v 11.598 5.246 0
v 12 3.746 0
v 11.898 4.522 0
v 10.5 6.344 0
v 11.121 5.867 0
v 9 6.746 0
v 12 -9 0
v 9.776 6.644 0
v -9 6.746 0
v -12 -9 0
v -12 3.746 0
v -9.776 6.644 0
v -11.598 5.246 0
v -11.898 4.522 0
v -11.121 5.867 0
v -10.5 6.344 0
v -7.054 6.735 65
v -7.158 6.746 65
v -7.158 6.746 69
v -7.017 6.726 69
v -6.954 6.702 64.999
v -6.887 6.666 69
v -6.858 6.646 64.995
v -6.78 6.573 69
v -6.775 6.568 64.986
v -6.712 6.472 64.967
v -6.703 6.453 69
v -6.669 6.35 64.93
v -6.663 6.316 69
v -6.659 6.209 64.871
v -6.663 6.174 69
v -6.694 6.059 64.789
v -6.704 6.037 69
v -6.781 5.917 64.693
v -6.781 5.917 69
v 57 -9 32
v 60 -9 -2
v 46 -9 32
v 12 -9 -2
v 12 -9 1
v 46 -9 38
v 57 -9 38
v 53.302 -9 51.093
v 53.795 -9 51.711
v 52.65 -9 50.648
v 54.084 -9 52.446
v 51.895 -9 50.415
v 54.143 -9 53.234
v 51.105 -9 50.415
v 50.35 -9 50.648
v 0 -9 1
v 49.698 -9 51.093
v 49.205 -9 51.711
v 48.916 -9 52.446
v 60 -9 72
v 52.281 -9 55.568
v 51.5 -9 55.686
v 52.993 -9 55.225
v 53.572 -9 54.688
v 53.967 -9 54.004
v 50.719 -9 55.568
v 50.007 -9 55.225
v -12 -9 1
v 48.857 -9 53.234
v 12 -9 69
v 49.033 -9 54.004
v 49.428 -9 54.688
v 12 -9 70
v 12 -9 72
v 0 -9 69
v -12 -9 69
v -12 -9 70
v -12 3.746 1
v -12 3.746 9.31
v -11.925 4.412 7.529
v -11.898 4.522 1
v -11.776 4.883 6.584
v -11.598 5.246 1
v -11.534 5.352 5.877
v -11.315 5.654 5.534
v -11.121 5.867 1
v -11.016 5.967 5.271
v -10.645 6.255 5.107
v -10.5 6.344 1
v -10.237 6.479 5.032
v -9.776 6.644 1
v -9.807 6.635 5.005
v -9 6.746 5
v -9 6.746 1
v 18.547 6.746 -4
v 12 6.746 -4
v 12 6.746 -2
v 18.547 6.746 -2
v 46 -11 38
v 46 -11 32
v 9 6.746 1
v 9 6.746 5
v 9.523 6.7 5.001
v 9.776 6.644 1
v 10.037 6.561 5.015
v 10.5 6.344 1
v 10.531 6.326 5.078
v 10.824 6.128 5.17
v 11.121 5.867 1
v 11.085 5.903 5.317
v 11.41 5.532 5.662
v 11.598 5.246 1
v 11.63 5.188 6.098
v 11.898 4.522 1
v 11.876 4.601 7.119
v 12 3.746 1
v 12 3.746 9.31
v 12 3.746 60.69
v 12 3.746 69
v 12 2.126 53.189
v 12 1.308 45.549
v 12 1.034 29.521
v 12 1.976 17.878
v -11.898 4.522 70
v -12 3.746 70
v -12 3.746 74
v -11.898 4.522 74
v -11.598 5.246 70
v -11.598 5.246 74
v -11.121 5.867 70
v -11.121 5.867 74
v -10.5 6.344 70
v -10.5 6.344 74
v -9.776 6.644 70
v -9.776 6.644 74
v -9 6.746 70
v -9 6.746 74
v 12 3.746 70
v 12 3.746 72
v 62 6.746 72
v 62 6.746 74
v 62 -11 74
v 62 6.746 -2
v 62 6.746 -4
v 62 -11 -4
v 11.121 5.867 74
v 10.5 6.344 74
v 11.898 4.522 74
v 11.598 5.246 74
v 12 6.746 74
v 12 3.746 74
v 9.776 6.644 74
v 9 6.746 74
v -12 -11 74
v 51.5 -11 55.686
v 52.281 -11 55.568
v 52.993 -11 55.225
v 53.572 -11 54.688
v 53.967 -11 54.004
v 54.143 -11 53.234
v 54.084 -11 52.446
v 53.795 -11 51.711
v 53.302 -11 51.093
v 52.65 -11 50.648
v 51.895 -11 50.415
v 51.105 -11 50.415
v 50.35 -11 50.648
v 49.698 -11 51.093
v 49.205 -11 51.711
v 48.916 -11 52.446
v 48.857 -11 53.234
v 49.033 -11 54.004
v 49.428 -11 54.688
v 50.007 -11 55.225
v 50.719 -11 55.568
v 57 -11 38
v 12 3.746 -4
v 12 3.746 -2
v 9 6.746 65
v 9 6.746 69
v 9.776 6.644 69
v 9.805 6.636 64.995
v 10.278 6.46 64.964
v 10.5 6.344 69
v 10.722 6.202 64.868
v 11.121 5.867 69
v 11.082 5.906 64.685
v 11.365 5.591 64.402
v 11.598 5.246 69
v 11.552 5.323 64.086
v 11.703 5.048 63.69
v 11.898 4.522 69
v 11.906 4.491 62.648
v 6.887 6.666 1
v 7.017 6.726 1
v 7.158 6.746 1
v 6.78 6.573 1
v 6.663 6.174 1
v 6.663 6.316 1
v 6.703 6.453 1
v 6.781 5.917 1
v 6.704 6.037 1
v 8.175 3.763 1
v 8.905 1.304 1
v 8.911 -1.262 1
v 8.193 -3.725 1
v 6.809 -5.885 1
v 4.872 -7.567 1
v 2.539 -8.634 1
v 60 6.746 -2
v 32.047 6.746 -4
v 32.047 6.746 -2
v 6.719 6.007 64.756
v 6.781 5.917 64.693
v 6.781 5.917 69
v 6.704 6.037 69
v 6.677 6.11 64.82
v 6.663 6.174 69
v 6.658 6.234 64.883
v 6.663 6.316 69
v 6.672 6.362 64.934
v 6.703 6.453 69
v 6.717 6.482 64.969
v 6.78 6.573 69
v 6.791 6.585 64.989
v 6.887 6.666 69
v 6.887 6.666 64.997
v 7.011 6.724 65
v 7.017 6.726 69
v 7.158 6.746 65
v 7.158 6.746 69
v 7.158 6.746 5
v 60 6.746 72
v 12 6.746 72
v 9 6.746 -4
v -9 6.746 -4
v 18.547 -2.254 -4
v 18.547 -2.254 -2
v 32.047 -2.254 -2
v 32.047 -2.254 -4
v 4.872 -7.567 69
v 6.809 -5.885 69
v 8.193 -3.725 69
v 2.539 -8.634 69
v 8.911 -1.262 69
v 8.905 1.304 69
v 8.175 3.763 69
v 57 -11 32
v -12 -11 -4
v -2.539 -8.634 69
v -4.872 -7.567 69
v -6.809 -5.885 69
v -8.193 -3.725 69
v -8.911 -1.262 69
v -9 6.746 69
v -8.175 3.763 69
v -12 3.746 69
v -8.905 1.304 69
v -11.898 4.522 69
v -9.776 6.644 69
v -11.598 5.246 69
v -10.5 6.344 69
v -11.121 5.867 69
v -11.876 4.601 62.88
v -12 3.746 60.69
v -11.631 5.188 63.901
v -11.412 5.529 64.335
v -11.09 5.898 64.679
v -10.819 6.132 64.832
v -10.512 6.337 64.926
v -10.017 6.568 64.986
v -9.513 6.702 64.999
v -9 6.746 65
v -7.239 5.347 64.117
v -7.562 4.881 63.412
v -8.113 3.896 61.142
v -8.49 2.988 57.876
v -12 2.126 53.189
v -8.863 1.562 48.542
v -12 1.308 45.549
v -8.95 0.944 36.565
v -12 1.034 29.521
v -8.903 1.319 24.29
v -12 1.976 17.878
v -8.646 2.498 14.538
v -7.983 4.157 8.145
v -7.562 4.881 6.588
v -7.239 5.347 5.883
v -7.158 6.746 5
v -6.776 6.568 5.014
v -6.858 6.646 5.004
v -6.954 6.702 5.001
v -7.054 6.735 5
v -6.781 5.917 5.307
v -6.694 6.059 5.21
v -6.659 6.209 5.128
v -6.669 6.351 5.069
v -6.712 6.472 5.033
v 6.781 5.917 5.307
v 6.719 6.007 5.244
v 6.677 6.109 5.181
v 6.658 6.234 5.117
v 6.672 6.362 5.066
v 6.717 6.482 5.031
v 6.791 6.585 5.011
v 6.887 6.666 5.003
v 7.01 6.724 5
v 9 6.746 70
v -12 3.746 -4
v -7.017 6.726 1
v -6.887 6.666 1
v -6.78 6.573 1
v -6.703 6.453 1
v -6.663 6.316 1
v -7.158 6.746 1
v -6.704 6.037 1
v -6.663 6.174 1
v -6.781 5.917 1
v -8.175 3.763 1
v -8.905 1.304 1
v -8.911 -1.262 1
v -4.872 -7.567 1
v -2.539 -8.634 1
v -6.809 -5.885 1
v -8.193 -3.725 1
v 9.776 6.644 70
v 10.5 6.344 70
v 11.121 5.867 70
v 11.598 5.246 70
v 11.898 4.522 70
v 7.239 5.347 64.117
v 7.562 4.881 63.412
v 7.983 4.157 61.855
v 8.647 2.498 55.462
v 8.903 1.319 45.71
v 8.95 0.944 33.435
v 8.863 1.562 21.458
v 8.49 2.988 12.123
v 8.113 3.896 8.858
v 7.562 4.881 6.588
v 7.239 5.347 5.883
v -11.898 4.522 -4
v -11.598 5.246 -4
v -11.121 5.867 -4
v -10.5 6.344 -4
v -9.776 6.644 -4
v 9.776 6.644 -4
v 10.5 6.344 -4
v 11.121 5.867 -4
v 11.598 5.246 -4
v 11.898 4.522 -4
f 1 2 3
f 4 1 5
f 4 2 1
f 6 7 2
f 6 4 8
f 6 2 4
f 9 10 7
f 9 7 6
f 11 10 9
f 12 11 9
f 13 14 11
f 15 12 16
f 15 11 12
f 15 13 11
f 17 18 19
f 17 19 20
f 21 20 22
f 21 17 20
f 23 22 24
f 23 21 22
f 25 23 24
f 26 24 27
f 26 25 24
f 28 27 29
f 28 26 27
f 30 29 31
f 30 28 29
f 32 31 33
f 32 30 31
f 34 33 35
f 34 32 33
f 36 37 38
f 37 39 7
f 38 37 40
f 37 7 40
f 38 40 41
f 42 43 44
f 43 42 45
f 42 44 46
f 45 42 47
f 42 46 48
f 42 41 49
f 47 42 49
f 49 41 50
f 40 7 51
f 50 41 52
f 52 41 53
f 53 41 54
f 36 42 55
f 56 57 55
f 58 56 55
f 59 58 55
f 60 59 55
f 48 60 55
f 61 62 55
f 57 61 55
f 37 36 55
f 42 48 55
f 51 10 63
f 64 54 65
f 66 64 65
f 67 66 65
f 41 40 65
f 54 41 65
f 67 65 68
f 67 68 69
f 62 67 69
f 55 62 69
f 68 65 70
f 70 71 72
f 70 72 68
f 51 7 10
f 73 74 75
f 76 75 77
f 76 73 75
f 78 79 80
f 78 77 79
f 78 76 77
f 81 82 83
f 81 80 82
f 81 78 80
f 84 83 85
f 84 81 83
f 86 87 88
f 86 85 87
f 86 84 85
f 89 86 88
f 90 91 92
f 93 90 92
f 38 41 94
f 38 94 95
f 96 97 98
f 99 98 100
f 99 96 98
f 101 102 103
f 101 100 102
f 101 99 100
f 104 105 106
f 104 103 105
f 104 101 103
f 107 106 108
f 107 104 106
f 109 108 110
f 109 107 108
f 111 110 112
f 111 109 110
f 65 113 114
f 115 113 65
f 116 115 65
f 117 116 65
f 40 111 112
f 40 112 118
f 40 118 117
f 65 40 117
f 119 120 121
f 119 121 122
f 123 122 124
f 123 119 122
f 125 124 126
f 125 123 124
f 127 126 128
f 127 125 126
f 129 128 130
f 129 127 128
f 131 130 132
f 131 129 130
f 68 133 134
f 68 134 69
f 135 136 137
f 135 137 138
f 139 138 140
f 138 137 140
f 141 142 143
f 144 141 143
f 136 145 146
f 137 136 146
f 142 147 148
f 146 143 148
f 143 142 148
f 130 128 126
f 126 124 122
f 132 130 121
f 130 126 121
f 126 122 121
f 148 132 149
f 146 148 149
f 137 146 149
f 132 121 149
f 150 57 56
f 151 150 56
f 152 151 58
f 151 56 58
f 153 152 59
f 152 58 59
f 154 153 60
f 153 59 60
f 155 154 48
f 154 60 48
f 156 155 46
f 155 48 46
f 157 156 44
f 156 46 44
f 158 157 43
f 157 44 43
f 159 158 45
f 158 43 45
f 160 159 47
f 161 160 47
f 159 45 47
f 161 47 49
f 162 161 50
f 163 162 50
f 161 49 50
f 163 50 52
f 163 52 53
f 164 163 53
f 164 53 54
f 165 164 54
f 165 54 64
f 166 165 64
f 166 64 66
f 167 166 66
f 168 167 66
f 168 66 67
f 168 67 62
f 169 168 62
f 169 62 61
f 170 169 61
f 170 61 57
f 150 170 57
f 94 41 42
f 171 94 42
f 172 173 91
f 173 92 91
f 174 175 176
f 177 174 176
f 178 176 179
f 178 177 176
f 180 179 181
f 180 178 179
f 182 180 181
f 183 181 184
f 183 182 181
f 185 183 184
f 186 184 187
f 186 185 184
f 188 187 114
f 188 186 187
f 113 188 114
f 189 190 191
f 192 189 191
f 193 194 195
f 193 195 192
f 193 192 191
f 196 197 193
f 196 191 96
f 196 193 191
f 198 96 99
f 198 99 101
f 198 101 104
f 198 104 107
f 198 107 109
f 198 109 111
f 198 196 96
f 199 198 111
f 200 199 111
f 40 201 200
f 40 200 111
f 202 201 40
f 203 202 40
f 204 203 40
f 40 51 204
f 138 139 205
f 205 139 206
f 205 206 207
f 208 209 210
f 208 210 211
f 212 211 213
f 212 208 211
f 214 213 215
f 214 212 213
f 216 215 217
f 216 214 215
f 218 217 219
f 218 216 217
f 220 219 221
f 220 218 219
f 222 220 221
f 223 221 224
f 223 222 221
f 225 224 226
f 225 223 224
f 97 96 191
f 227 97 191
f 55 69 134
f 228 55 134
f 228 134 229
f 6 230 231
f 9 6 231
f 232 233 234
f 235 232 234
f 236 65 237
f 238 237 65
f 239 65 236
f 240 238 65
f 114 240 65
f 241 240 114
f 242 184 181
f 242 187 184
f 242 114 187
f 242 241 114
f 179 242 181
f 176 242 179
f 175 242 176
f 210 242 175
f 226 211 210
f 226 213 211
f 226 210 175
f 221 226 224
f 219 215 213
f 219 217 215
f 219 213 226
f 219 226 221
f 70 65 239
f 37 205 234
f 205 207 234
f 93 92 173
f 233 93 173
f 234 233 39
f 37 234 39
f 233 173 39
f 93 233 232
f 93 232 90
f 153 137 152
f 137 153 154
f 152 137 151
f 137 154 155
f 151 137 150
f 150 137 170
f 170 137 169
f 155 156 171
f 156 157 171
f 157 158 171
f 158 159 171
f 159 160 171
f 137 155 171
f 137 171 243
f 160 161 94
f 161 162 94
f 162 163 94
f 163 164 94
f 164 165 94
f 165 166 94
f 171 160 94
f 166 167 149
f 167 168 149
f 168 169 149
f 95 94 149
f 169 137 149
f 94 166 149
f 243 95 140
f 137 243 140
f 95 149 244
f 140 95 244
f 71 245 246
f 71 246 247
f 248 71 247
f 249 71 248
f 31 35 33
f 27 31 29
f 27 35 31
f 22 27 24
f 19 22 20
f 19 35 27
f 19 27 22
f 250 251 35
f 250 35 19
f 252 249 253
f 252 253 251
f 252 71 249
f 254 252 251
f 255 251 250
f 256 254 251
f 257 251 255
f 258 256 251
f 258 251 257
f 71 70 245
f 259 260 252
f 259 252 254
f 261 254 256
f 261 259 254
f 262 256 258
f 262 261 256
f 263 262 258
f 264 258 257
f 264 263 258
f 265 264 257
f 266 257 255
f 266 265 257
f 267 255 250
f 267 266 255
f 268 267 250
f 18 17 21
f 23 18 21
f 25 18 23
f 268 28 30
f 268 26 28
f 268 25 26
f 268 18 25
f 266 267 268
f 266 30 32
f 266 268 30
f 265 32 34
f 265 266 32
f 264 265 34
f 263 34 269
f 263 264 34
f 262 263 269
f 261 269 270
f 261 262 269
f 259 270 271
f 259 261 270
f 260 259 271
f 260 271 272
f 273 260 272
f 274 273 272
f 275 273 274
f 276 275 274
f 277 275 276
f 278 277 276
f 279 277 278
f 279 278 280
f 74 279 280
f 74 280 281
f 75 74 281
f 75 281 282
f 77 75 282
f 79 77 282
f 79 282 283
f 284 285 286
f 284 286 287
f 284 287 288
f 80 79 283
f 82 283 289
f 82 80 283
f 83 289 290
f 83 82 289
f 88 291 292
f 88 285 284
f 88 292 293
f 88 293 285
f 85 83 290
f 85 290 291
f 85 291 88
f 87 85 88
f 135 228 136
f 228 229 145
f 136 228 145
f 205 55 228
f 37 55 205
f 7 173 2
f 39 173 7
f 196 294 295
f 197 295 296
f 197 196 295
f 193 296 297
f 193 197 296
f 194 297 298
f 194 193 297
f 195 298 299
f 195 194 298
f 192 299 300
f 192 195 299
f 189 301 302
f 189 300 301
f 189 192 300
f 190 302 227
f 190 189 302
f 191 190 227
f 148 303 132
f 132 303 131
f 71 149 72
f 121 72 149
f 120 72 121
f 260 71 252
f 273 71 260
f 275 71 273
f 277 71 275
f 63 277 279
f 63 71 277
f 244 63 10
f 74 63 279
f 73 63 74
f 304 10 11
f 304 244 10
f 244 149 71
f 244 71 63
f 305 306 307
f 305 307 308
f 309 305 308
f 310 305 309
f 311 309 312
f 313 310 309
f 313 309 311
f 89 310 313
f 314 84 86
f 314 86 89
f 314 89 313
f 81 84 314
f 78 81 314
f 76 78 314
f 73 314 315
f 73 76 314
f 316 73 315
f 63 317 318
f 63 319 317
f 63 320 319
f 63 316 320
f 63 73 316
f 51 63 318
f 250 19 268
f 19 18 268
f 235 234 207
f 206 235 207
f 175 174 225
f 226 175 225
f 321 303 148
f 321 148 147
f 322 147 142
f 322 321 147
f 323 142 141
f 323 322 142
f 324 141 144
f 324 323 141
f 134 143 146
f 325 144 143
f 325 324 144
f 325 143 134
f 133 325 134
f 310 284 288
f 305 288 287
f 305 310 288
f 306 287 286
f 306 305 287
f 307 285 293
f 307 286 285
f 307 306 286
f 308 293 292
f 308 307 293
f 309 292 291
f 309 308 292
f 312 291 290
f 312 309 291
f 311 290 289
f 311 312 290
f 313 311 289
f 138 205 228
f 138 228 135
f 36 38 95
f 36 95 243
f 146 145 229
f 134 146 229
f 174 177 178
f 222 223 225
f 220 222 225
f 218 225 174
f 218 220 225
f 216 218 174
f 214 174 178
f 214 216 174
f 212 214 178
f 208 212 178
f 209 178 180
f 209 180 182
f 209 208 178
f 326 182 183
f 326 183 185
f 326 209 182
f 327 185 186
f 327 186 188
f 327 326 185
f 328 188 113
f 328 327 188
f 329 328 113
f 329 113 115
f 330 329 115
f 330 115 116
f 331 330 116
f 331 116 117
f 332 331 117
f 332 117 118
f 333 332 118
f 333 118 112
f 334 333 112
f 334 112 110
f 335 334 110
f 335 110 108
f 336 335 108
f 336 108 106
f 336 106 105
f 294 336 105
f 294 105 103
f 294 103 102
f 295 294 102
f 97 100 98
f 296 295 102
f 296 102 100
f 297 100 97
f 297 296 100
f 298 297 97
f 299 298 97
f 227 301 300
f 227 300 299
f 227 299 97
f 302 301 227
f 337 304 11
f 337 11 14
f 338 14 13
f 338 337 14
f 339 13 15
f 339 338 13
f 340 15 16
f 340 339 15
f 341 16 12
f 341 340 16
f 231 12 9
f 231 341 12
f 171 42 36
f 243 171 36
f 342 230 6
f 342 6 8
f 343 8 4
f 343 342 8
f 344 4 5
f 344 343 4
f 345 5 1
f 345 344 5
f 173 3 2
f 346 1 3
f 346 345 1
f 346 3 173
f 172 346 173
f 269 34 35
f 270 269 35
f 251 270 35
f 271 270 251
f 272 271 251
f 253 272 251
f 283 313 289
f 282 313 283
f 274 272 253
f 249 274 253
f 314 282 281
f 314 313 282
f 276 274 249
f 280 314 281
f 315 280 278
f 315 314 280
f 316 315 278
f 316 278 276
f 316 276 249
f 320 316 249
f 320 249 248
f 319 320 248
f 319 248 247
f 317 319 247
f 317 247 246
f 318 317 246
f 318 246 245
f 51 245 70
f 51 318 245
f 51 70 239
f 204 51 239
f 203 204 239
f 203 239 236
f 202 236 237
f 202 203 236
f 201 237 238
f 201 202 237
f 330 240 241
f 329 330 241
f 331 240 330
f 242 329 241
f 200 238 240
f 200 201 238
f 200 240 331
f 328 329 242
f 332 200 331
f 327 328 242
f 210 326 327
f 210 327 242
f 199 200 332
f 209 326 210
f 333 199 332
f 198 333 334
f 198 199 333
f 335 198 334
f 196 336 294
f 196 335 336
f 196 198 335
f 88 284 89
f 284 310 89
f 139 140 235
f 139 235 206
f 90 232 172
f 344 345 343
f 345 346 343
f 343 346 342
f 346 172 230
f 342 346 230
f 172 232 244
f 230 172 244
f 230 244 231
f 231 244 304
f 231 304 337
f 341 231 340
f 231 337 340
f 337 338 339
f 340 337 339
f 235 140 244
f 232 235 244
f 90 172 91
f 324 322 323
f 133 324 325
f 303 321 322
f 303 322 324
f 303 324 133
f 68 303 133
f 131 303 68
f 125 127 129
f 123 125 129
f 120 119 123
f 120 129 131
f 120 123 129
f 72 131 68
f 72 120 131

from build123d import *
from build123d.topology import SkipClean

# Parameters (mm, degrees)
SALIENTE_EXTRUIR2_DEPTH    = 70
SALIENTE_EXTRUIR4_START    = -4
SALIENTE_EXTRUIR4_DEPTH    = 4
SALIENTE_EXTRUIR5_START    = 70
SALIENTE_EXTRUIR5_DEPTH    = 4
CORTAR_EXTRUIR1_DEPTH      = 15
CORTAR_EXTRUIR1_DEPTH_BACK = 79.568441502
CROQUIS5_RX                = 30
CROQUIS5_RY                = 5.809368516
SALIENTE_EXTRUIR6_DEPTH    = 50
CROQUIS7_W                 = 2
CROQUIS7_H                 = 74
SALIENTE_EXTRUIR7_DEPTH    = 15.745948
CROQUIS9_R                 = 2.65
CROQUIS9_W                 = 11
CROQUIS9_H                 = 6
CORTAR_EXTRUIR2_DEPTH      = 10
CORTAR_EXTRUIR3_REACH      = 100.697
CROQUIS10_W                = 13.5
CROQUIS10_H                = 9


with BuildPart() as part:
    # Croquis1 → Saliente-Extruir2 (new body)
    with BuildSketch(Plane.XY):
        with BuildLine():
            Line((-9, 6.745948294), (-7.15808144, 6.745948294))
            ThreePointArc((-7.15808144, 6.745948294), (-6.702907265, 6.452869704), (-6.781340312, 5.917214173))
            ThreePointArc((-6.781340312, 5.917214173), (0, -9), (6.781340312, 5.917214173))
            ThreePointArc((6.781340312, 5.917214173), (6.702907265, 6.452869704), (7.15808144, 6.745948294))
            Line((7.15808144, 6.745948294), (9, 6.745948294))
            ThreePointArc((9, 6.745948294), (11.121320344, 5.867268638), (12, 3.745948294))
            Line((12, 3.745948294), (12, -11))
            Line((12, -11), (-12, -11))
            Line((-12, -11), (-12, 3.745948294))
            ThreePointArc((-12, 3.745948294), (-11.121320344, 5.867268638), (-9, 6.745948294))
        make_face()
    extrude(amount=SALIENTE_EXTRUIR2_DEPTH)

    # Croquis1<6> → Saliente-Extruir4 (add)
    with BuildSketch(Plane.XY.offset(SALIENTE_EXTRUIR4_START)):
        with BuildLine():
            Line((7.15808144, 6.745948294), (9, 6.745948294))
            ThreePointArc((9, 6.745948294), (11.121320344, 5.867268638), (12, 3.745948294))
            Line((12, 3.745948294), (12, -11))
            Line((12, -11), (-12, -11))
            Line((-12, -11), (-12, 3.745948294))
            ThreePointArc((-12, 3.745948294), (-11.121320344, 5.867268638), (-9, 6.745948294))
            Line((-9, 6.745948294), (-7.15808144, 6.745948294))
            ThreePointArc((-7.15808144, 6.745948294), (-6.702907265, 6.452869704), (-6.781340312, 5.917214173))
            ThreePointArc((-6.781340312, 5.917214173), (0, -9), (6.781340312, 5.917214173))
            ThreePointArc((6.781340312, 5.917214173), (6.702907265, 6.452869704), (7.15808144, 6.745948294))
        make_face()
        with BuildLine():
            Line((7.15808144, 6.745948294), (-7.15808144, 6.745948294))
            ThreePointArc((-7.15808144, 6.745948294), (-6.702907265, 6.452869704), (-6.781340312, 5.917214173))
            ThreePointArc((-6.781340312, 5.917214173), (0, -9), (6.781340312, 5.917214173))
            ThreePointArc((6.781340312, 5.917214173), (6.702907265, 6.452869704), (7.15808144, 6.745948294))
        make_face()
    extrude(amount=SALIENTE_EXTRUIR4_DEPTH)

    # Croquis1<9> → Saliente-Extruir5 (add)
    with BuildSketch(Plane.XY.offset(SALIENTE_EXTRUIR5_START)):
        with BuildLine():
            Line((7.15808144, 6.745948294), (9, 6.745948294))
            ThreePointArc((9, 6.745948294), (11.121320344, 5.867268638), (12, 3.745948294))
            Line((12, 3.745948294), (12, -11))
            Line((12, -11), (-12, -11))
            Line((-12, -11), (-12, 3.745948294))
            ThreePointArc((-12, 3.745948294), (-11.121320344, 5.867268638), (-9, 6.745948294))
            Line((-9, 6.745948294), (-7.15808144, 6.745948294))
            ThreePointArc((-7.15808144, 6.745948294), (-6.702907265, 6.452869704), (-6.781340312, 5.917214173))
            ThreePointArc((-6.781340312, 5.917214173), (0, -9), (6.781340312, 5.917214173))
            ThreePointArc((6.781340312, 5.917214173), (6.702907265, 6.452869704), (7.15808144, 6.745948294))
        make_face()
        with BuildLine():
            Line((7.15808144, 6.745948294), (-7.15808144, 6.745948294))
            ThreePointArc((-7.15808144, 6.745948294), (-6.702907265, 6.452869704), (-6.781340312, 5.917214173))
            ThreePointArc((-6.781340312, 5.917214173), (0, -9), (6.781340312, 5.917214173))
            ThreePointArc((6.781340312, 5.917214173), (6.702907265, 6.452869704), (7.15808144, 6.745948294))
        make_face()
    extrude(amount=SALIENTE_EXTRUIR5_DEPTH)

    # Croquis5 → Cortar-Extruir1 (cut, two sides: drawn at the far end of the back side and taken through both)
    with BuildSketch(Plane(origin=(12, 0, 0), x_dir=(0, 0, -1), z_dir=(1, 0, 0)).offset(-CORTAR_EXTRUIR1_DEPTH_BACK)):
        with Locations(Location((-35, 6.745948294), (0, 0, 0))):
            Ellipse(CROQUIS5_RX, CROQUIS5_RY)
        Polygon((0, 5.917214173), (0, -9), (-0.999510264, -9), (-0.999510264, 5.948506852), (-0.999510264, 6.745948294), (0, 6.745948294), align=None)
        Polygon((-70, 5.917214173), (-70, -9), (-69.000489736, -9), (-69.000489736, 5.948506852), (-69.000489736, 6.745948294), (-70, 6.745948294), align=None)
    extrude(amount=CORTAR_EXTRUIR1_DEPTH + CORTAR_EXTRUIR1_DEPTH_BACK, mode=Mode.SUBTRACT)

    # Croquis6 → Saliente-Extruir6 (add)
    with BuildSketch(Plane(origin=(12, 0, 0), x_dir=(0, 0, -1), z_dir=(1, 0, 0))):
        Polygon((-74, -11), (4, -11), (4, -9), (4, 6.745948294), (2, 6.745948294), (2, -9), (-72, -9), (-72, 6.745948294), (-74, 6.745948294), (-74, -9), align=None)
    extrude(amount=SALIENTE_EXTRUIR6_DEPTH)

    # Croquis7 → Saliente-Extruir7 (add)
    with SkipClean():  # the faces are left unmerged after this step: merging them gives an invalid solid
        with BuildSketch(Plane(origin=(0, -9, 0), x_dir=(1, 0, 0), z_dir=(0, 1, 0))):
            with Locations((61, -35)):
                Rectangle(CROQUIS7_W, CROQUIS7_H)
        extrude(amount=SALIENTE_EXTRUIR7_DEPTH)

    # Croquis9 → Cortar-Extruir2 (cut)
    with SkipClean():  # the faces are left unmerged after this step: merging them gives an invalid solid
        with BuildSketch(Plane(origin=(0, -9, 0), x_dir=(1, 0, 0), z_dir=(0, 1, 0))):
            with Locations(Location((51.5, -53.035506603, 0), (0, 0, 270))):
                Circle(CROQUIS9_R)
            with Locations((51.5, -35)):
                Rectangle(CROQUIS9_W, CROQUIS9_H)
        extrude(amount=-CORTAR_EXTRUIR2_DEPTH, mode=Mode.SUBTRACT)

    # Croquis10 → Cortar-Extruir3 (cut, up to next)
    with BuildSketch(Plane.XY.offset(-2), mode=Mode.PRIVATE) as cortar_extruir3_sk1:
        with Locations((25.297097726, 2.245948294)):
            Rectangle(CROQUIS10_W, CROQUIS10_H)
    cortar_extruir3_tool1 = extrude(cortar_extruir3_sk1.sketch, amount=-CORTAR_EXTRUIR3_REACH, mode=Mode.PRIVATE) & part.part
    add(cortar_extruir3_tool1.solids().sort_by_distance((25.297098, 2.245948, -2))[0], mode=Mode.SUBTRACT)


solid = part.part
